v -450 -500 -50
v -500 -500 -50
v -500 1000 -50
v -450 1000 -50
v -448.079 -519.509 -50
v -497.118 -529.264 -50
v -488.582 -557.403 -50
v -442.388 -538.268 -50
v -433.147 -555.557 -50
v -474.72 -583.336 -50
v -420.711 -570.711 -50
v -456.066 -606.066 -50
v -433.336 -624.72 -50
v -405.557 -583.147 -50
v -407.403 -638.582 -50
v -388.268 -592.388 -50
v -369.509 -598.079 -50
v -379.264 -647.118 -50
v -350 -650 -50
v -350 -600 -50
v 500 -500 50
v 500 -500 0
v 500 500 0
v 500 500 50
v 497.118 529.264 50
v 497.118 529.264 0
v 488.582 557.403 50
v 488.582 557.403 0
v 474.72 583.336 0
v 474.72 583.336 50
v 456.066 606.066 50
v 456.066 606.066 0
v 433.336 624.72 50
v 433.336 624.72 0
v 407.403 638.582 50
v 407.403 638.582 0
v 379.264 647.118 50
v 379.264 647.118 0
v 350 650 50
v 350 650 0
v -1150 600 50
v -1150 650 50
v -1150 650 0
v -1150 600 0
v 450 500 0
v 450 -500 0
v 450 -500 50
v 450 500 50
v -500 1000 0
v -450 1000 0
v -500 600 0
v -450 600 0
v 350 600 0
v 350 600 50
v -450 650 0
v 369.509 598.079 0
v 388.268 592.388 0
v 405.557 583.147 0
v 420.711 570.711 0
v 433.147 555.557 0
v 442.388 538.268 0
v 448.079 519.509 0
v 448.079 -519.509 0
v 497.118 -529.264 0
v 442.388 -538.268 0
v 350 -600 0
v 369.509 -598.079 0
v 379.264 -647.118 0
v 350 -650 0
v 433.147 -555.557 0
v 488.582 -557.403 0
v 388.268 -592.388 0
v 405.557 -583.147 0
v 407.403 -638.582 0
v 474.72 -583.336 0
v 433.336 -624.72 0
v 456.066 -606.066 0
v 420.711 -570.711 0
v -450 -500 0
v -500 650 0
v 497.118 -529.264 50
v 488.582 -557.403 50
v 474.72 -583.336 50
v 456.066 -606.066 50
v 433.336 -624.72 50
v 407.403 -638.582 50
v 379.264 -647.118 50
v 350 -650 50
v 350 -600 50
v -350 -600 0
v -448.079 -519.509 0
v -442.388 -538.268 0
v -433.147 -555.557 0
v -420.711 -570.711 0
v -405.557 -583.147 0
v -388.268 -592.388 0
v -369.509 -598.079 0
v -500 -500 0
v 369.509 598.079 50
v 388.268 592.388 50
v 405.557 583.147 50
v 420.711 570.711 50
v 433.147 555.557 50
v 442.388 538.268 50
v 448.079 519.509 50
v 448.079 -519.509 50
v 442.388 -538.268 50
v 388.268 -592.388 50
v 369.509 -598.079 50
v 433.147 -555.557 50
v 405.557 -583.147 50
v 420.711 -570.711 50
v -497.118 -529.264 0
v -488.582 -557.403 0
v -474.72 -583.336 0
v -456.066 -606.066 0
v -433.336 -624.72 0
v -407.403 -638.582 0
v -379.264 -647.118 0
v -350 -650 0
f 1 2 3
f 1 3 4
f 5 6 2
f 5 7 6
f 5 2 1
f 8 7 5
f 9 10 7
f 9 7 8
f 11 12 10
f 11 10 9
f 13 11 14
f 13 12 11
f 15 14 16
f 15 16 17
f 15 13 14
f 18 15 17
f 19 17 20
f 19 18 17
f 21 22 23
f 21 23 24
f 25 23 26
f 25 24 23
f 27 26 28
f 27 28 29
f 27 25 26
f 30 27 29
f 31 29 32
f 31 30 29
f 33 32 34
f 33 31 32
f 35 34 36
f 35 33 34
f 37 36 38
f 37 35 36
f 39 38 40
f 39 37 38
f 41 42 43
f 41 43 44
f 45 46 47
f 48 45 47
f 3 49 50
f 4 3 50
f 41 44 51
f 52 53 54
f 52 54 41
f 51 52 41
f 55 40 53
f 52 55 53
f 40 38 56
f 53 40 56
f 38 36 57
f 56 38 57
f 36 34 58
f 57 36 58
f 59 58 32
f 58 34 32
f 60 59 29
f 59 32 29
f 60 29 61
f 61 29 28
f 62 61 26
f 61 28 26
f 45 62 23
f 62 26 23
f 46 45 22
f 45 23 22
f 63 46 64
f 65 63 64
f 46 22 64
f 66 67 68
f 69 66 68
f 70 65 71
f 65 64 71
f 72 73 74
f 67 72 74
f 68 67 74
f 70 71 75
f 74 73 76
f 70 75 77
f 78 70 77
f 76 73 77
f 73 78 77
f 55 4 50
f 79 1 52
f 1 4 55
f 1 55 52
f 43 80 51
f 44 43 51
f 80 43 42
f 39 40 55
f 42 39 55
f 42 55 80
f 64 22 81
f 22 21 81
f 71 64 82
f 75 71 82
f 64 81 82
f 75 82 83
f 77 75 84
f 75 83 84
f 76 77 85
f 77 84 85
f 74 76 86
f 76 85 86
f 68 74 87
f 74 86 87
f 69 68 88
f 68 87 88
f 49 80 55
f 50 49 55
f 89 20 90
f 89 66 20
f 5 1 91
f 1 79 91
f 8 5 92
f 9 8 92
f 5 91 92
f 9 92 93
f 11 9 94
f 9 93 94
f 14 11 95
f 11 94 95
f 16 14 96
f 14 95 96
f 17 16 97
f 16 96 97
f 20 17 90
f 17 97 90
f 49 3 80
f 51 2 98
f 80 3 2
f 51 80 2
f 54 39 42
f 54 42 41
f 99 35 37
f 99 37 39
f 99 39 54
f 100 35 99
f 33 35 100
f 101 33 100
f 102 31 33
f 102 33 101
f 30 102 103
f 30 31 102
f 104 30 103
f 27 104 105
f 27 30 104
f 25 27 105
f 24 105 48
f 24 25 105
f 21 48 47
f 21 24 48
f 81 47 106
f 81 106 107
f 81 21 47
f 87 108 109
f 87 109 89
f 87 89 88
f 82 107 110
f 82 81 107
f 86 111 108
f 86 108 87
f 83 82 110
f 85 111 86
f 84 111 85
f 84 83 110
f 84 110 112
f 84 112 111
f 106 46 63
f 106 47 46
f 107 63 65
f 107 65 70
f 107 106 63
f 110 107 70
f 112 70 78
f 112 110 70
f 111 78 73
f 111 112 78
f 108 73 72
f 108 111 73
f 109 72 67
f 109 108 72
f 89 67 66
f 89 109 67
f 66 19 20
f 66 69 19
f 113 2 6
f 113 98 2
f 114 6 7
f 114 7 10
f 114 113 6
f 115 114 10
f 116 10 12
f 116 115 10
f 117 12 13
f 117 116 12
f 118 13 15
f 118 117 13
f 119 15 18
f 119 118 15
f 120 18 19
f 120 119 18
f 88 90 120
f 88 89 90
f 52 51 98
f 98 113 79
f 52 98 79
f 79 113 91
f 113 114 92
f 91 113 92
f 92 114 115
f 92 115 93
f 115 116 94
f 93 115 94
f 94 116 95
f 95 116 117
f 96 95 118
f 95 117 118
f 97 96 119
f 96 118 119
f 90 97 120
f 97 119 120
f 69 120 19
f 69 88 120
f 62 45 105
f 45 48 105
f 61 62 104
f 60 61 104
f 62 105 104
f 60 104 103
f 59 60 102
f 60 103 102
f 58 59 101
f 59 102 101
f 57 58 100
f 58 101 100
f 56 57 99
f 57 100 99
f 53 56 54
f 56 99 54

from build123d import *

# Parameters (mm, degrees)
F0_W      = 50
F0_H      = 50
F1_DEPTH  = 500
F3_W      = 50
F3_H      = 50
F4_ANGLE  = 90
F5_ANGLE  = 90
F4_FACE_W = 50
F4_FACE_H = 50
F5_FACE_W = 50
F5_FACE_H = 50
F7_DEPTH  = 500
F8_W      = 50
F8_H      = 50
F9_ANGLE  = 90
F10_DEPTH = 1500


with BuildPart() as f1:
    # F0 (on Front) → F1 (new body, symmetric)
    with BuildSketch(Plane.XZ):
        with Locations((475, 25)):
            Rectangle(F0_W, F0_H)
    extrude(amount=F1_DEPTH, both=True)

    # F3 (on offset) → F5 (revolve)
    with BuildSketch(Plane.XZ.offset(500)):
        with Locations((475, 25)):
            Rectangle(F3_W, F3_H)
    revolve(axis=Axis((350, -500, -3.7102438509), (0, 0, -1)), revolution_arc=F5_ANGLE)



with BuildPart() as f1b:
    # F0 (on Front) → F1, piece 2 (new body, symmetric)
    with BuildSketch(Plane.XZ):
        with Locations((-475, -25)):
            Rectangle(F0_W, F0_H)
    extrude(amount=F1_DEPTH, both=True)

    # F3 (on offset) → F4 (revolve)
    with BuildSketch(Plane.XZ.offset(500)):
        with Locations((-475, -25)):
            Rectangle(F3_W, F3_H)
    revolve(axis=Axis((-350, -500, -32.6501708478), (0, 0, 1)), revolution_arc=F4_ANGLE)


with BuildPart() as f1_1:
    add(f1.part)

    add(f1b.part)  # F6 merges F1b
    # F4_face (on face) → F6 section 0
    with BuildSketch(Plane(origin=(-350, -625, -25), x_dir=(0, 1, 0), z_dir=(1, 0, 0))):
        Rectangle(F4_FACE_W, F4_FACE_H)
    # F5_face (on face) → F6 section 1
    with BuildSketch(Plane(origin=(350, -625, 25), x_dir=(0, -1, 0), z_dir=(-1, 0, 0))):
        Rectangle(F5_FACE_W, F5_FACE_H)
    loft()

    # F7 (add): a face of the model
    f7_faces = [f1_1.faces().sort_by_distance(p)[0] for p in [
        (-475, 500, -25),
    ]]
    extrude(f7_faces, amount=F7_DEPTH)

    # F8 (on face) → F9 (revolve)
    with BuildSketch(Plane(origin=(0, 500, 0), x_dir=(-1, 0, 0), z_dir=(0, 1, 0))):
        with Locations((-475, 25)):
            Rectangle(F8_W, F8_H)
    revolve(axis=Axis((350, 500, -1.4840960503), (0, 0, 1)), revolution_arc=F9_ANGLE)

    # F10 (add): a face of the model
    f10_faces = [f1_1.faces().sort_by_distance(p)[0] for p in [
        (350, 625, 25),
    ]]
    extrude(f10_faces, amount=F10_DEPTH)


solid = f1_1.part
